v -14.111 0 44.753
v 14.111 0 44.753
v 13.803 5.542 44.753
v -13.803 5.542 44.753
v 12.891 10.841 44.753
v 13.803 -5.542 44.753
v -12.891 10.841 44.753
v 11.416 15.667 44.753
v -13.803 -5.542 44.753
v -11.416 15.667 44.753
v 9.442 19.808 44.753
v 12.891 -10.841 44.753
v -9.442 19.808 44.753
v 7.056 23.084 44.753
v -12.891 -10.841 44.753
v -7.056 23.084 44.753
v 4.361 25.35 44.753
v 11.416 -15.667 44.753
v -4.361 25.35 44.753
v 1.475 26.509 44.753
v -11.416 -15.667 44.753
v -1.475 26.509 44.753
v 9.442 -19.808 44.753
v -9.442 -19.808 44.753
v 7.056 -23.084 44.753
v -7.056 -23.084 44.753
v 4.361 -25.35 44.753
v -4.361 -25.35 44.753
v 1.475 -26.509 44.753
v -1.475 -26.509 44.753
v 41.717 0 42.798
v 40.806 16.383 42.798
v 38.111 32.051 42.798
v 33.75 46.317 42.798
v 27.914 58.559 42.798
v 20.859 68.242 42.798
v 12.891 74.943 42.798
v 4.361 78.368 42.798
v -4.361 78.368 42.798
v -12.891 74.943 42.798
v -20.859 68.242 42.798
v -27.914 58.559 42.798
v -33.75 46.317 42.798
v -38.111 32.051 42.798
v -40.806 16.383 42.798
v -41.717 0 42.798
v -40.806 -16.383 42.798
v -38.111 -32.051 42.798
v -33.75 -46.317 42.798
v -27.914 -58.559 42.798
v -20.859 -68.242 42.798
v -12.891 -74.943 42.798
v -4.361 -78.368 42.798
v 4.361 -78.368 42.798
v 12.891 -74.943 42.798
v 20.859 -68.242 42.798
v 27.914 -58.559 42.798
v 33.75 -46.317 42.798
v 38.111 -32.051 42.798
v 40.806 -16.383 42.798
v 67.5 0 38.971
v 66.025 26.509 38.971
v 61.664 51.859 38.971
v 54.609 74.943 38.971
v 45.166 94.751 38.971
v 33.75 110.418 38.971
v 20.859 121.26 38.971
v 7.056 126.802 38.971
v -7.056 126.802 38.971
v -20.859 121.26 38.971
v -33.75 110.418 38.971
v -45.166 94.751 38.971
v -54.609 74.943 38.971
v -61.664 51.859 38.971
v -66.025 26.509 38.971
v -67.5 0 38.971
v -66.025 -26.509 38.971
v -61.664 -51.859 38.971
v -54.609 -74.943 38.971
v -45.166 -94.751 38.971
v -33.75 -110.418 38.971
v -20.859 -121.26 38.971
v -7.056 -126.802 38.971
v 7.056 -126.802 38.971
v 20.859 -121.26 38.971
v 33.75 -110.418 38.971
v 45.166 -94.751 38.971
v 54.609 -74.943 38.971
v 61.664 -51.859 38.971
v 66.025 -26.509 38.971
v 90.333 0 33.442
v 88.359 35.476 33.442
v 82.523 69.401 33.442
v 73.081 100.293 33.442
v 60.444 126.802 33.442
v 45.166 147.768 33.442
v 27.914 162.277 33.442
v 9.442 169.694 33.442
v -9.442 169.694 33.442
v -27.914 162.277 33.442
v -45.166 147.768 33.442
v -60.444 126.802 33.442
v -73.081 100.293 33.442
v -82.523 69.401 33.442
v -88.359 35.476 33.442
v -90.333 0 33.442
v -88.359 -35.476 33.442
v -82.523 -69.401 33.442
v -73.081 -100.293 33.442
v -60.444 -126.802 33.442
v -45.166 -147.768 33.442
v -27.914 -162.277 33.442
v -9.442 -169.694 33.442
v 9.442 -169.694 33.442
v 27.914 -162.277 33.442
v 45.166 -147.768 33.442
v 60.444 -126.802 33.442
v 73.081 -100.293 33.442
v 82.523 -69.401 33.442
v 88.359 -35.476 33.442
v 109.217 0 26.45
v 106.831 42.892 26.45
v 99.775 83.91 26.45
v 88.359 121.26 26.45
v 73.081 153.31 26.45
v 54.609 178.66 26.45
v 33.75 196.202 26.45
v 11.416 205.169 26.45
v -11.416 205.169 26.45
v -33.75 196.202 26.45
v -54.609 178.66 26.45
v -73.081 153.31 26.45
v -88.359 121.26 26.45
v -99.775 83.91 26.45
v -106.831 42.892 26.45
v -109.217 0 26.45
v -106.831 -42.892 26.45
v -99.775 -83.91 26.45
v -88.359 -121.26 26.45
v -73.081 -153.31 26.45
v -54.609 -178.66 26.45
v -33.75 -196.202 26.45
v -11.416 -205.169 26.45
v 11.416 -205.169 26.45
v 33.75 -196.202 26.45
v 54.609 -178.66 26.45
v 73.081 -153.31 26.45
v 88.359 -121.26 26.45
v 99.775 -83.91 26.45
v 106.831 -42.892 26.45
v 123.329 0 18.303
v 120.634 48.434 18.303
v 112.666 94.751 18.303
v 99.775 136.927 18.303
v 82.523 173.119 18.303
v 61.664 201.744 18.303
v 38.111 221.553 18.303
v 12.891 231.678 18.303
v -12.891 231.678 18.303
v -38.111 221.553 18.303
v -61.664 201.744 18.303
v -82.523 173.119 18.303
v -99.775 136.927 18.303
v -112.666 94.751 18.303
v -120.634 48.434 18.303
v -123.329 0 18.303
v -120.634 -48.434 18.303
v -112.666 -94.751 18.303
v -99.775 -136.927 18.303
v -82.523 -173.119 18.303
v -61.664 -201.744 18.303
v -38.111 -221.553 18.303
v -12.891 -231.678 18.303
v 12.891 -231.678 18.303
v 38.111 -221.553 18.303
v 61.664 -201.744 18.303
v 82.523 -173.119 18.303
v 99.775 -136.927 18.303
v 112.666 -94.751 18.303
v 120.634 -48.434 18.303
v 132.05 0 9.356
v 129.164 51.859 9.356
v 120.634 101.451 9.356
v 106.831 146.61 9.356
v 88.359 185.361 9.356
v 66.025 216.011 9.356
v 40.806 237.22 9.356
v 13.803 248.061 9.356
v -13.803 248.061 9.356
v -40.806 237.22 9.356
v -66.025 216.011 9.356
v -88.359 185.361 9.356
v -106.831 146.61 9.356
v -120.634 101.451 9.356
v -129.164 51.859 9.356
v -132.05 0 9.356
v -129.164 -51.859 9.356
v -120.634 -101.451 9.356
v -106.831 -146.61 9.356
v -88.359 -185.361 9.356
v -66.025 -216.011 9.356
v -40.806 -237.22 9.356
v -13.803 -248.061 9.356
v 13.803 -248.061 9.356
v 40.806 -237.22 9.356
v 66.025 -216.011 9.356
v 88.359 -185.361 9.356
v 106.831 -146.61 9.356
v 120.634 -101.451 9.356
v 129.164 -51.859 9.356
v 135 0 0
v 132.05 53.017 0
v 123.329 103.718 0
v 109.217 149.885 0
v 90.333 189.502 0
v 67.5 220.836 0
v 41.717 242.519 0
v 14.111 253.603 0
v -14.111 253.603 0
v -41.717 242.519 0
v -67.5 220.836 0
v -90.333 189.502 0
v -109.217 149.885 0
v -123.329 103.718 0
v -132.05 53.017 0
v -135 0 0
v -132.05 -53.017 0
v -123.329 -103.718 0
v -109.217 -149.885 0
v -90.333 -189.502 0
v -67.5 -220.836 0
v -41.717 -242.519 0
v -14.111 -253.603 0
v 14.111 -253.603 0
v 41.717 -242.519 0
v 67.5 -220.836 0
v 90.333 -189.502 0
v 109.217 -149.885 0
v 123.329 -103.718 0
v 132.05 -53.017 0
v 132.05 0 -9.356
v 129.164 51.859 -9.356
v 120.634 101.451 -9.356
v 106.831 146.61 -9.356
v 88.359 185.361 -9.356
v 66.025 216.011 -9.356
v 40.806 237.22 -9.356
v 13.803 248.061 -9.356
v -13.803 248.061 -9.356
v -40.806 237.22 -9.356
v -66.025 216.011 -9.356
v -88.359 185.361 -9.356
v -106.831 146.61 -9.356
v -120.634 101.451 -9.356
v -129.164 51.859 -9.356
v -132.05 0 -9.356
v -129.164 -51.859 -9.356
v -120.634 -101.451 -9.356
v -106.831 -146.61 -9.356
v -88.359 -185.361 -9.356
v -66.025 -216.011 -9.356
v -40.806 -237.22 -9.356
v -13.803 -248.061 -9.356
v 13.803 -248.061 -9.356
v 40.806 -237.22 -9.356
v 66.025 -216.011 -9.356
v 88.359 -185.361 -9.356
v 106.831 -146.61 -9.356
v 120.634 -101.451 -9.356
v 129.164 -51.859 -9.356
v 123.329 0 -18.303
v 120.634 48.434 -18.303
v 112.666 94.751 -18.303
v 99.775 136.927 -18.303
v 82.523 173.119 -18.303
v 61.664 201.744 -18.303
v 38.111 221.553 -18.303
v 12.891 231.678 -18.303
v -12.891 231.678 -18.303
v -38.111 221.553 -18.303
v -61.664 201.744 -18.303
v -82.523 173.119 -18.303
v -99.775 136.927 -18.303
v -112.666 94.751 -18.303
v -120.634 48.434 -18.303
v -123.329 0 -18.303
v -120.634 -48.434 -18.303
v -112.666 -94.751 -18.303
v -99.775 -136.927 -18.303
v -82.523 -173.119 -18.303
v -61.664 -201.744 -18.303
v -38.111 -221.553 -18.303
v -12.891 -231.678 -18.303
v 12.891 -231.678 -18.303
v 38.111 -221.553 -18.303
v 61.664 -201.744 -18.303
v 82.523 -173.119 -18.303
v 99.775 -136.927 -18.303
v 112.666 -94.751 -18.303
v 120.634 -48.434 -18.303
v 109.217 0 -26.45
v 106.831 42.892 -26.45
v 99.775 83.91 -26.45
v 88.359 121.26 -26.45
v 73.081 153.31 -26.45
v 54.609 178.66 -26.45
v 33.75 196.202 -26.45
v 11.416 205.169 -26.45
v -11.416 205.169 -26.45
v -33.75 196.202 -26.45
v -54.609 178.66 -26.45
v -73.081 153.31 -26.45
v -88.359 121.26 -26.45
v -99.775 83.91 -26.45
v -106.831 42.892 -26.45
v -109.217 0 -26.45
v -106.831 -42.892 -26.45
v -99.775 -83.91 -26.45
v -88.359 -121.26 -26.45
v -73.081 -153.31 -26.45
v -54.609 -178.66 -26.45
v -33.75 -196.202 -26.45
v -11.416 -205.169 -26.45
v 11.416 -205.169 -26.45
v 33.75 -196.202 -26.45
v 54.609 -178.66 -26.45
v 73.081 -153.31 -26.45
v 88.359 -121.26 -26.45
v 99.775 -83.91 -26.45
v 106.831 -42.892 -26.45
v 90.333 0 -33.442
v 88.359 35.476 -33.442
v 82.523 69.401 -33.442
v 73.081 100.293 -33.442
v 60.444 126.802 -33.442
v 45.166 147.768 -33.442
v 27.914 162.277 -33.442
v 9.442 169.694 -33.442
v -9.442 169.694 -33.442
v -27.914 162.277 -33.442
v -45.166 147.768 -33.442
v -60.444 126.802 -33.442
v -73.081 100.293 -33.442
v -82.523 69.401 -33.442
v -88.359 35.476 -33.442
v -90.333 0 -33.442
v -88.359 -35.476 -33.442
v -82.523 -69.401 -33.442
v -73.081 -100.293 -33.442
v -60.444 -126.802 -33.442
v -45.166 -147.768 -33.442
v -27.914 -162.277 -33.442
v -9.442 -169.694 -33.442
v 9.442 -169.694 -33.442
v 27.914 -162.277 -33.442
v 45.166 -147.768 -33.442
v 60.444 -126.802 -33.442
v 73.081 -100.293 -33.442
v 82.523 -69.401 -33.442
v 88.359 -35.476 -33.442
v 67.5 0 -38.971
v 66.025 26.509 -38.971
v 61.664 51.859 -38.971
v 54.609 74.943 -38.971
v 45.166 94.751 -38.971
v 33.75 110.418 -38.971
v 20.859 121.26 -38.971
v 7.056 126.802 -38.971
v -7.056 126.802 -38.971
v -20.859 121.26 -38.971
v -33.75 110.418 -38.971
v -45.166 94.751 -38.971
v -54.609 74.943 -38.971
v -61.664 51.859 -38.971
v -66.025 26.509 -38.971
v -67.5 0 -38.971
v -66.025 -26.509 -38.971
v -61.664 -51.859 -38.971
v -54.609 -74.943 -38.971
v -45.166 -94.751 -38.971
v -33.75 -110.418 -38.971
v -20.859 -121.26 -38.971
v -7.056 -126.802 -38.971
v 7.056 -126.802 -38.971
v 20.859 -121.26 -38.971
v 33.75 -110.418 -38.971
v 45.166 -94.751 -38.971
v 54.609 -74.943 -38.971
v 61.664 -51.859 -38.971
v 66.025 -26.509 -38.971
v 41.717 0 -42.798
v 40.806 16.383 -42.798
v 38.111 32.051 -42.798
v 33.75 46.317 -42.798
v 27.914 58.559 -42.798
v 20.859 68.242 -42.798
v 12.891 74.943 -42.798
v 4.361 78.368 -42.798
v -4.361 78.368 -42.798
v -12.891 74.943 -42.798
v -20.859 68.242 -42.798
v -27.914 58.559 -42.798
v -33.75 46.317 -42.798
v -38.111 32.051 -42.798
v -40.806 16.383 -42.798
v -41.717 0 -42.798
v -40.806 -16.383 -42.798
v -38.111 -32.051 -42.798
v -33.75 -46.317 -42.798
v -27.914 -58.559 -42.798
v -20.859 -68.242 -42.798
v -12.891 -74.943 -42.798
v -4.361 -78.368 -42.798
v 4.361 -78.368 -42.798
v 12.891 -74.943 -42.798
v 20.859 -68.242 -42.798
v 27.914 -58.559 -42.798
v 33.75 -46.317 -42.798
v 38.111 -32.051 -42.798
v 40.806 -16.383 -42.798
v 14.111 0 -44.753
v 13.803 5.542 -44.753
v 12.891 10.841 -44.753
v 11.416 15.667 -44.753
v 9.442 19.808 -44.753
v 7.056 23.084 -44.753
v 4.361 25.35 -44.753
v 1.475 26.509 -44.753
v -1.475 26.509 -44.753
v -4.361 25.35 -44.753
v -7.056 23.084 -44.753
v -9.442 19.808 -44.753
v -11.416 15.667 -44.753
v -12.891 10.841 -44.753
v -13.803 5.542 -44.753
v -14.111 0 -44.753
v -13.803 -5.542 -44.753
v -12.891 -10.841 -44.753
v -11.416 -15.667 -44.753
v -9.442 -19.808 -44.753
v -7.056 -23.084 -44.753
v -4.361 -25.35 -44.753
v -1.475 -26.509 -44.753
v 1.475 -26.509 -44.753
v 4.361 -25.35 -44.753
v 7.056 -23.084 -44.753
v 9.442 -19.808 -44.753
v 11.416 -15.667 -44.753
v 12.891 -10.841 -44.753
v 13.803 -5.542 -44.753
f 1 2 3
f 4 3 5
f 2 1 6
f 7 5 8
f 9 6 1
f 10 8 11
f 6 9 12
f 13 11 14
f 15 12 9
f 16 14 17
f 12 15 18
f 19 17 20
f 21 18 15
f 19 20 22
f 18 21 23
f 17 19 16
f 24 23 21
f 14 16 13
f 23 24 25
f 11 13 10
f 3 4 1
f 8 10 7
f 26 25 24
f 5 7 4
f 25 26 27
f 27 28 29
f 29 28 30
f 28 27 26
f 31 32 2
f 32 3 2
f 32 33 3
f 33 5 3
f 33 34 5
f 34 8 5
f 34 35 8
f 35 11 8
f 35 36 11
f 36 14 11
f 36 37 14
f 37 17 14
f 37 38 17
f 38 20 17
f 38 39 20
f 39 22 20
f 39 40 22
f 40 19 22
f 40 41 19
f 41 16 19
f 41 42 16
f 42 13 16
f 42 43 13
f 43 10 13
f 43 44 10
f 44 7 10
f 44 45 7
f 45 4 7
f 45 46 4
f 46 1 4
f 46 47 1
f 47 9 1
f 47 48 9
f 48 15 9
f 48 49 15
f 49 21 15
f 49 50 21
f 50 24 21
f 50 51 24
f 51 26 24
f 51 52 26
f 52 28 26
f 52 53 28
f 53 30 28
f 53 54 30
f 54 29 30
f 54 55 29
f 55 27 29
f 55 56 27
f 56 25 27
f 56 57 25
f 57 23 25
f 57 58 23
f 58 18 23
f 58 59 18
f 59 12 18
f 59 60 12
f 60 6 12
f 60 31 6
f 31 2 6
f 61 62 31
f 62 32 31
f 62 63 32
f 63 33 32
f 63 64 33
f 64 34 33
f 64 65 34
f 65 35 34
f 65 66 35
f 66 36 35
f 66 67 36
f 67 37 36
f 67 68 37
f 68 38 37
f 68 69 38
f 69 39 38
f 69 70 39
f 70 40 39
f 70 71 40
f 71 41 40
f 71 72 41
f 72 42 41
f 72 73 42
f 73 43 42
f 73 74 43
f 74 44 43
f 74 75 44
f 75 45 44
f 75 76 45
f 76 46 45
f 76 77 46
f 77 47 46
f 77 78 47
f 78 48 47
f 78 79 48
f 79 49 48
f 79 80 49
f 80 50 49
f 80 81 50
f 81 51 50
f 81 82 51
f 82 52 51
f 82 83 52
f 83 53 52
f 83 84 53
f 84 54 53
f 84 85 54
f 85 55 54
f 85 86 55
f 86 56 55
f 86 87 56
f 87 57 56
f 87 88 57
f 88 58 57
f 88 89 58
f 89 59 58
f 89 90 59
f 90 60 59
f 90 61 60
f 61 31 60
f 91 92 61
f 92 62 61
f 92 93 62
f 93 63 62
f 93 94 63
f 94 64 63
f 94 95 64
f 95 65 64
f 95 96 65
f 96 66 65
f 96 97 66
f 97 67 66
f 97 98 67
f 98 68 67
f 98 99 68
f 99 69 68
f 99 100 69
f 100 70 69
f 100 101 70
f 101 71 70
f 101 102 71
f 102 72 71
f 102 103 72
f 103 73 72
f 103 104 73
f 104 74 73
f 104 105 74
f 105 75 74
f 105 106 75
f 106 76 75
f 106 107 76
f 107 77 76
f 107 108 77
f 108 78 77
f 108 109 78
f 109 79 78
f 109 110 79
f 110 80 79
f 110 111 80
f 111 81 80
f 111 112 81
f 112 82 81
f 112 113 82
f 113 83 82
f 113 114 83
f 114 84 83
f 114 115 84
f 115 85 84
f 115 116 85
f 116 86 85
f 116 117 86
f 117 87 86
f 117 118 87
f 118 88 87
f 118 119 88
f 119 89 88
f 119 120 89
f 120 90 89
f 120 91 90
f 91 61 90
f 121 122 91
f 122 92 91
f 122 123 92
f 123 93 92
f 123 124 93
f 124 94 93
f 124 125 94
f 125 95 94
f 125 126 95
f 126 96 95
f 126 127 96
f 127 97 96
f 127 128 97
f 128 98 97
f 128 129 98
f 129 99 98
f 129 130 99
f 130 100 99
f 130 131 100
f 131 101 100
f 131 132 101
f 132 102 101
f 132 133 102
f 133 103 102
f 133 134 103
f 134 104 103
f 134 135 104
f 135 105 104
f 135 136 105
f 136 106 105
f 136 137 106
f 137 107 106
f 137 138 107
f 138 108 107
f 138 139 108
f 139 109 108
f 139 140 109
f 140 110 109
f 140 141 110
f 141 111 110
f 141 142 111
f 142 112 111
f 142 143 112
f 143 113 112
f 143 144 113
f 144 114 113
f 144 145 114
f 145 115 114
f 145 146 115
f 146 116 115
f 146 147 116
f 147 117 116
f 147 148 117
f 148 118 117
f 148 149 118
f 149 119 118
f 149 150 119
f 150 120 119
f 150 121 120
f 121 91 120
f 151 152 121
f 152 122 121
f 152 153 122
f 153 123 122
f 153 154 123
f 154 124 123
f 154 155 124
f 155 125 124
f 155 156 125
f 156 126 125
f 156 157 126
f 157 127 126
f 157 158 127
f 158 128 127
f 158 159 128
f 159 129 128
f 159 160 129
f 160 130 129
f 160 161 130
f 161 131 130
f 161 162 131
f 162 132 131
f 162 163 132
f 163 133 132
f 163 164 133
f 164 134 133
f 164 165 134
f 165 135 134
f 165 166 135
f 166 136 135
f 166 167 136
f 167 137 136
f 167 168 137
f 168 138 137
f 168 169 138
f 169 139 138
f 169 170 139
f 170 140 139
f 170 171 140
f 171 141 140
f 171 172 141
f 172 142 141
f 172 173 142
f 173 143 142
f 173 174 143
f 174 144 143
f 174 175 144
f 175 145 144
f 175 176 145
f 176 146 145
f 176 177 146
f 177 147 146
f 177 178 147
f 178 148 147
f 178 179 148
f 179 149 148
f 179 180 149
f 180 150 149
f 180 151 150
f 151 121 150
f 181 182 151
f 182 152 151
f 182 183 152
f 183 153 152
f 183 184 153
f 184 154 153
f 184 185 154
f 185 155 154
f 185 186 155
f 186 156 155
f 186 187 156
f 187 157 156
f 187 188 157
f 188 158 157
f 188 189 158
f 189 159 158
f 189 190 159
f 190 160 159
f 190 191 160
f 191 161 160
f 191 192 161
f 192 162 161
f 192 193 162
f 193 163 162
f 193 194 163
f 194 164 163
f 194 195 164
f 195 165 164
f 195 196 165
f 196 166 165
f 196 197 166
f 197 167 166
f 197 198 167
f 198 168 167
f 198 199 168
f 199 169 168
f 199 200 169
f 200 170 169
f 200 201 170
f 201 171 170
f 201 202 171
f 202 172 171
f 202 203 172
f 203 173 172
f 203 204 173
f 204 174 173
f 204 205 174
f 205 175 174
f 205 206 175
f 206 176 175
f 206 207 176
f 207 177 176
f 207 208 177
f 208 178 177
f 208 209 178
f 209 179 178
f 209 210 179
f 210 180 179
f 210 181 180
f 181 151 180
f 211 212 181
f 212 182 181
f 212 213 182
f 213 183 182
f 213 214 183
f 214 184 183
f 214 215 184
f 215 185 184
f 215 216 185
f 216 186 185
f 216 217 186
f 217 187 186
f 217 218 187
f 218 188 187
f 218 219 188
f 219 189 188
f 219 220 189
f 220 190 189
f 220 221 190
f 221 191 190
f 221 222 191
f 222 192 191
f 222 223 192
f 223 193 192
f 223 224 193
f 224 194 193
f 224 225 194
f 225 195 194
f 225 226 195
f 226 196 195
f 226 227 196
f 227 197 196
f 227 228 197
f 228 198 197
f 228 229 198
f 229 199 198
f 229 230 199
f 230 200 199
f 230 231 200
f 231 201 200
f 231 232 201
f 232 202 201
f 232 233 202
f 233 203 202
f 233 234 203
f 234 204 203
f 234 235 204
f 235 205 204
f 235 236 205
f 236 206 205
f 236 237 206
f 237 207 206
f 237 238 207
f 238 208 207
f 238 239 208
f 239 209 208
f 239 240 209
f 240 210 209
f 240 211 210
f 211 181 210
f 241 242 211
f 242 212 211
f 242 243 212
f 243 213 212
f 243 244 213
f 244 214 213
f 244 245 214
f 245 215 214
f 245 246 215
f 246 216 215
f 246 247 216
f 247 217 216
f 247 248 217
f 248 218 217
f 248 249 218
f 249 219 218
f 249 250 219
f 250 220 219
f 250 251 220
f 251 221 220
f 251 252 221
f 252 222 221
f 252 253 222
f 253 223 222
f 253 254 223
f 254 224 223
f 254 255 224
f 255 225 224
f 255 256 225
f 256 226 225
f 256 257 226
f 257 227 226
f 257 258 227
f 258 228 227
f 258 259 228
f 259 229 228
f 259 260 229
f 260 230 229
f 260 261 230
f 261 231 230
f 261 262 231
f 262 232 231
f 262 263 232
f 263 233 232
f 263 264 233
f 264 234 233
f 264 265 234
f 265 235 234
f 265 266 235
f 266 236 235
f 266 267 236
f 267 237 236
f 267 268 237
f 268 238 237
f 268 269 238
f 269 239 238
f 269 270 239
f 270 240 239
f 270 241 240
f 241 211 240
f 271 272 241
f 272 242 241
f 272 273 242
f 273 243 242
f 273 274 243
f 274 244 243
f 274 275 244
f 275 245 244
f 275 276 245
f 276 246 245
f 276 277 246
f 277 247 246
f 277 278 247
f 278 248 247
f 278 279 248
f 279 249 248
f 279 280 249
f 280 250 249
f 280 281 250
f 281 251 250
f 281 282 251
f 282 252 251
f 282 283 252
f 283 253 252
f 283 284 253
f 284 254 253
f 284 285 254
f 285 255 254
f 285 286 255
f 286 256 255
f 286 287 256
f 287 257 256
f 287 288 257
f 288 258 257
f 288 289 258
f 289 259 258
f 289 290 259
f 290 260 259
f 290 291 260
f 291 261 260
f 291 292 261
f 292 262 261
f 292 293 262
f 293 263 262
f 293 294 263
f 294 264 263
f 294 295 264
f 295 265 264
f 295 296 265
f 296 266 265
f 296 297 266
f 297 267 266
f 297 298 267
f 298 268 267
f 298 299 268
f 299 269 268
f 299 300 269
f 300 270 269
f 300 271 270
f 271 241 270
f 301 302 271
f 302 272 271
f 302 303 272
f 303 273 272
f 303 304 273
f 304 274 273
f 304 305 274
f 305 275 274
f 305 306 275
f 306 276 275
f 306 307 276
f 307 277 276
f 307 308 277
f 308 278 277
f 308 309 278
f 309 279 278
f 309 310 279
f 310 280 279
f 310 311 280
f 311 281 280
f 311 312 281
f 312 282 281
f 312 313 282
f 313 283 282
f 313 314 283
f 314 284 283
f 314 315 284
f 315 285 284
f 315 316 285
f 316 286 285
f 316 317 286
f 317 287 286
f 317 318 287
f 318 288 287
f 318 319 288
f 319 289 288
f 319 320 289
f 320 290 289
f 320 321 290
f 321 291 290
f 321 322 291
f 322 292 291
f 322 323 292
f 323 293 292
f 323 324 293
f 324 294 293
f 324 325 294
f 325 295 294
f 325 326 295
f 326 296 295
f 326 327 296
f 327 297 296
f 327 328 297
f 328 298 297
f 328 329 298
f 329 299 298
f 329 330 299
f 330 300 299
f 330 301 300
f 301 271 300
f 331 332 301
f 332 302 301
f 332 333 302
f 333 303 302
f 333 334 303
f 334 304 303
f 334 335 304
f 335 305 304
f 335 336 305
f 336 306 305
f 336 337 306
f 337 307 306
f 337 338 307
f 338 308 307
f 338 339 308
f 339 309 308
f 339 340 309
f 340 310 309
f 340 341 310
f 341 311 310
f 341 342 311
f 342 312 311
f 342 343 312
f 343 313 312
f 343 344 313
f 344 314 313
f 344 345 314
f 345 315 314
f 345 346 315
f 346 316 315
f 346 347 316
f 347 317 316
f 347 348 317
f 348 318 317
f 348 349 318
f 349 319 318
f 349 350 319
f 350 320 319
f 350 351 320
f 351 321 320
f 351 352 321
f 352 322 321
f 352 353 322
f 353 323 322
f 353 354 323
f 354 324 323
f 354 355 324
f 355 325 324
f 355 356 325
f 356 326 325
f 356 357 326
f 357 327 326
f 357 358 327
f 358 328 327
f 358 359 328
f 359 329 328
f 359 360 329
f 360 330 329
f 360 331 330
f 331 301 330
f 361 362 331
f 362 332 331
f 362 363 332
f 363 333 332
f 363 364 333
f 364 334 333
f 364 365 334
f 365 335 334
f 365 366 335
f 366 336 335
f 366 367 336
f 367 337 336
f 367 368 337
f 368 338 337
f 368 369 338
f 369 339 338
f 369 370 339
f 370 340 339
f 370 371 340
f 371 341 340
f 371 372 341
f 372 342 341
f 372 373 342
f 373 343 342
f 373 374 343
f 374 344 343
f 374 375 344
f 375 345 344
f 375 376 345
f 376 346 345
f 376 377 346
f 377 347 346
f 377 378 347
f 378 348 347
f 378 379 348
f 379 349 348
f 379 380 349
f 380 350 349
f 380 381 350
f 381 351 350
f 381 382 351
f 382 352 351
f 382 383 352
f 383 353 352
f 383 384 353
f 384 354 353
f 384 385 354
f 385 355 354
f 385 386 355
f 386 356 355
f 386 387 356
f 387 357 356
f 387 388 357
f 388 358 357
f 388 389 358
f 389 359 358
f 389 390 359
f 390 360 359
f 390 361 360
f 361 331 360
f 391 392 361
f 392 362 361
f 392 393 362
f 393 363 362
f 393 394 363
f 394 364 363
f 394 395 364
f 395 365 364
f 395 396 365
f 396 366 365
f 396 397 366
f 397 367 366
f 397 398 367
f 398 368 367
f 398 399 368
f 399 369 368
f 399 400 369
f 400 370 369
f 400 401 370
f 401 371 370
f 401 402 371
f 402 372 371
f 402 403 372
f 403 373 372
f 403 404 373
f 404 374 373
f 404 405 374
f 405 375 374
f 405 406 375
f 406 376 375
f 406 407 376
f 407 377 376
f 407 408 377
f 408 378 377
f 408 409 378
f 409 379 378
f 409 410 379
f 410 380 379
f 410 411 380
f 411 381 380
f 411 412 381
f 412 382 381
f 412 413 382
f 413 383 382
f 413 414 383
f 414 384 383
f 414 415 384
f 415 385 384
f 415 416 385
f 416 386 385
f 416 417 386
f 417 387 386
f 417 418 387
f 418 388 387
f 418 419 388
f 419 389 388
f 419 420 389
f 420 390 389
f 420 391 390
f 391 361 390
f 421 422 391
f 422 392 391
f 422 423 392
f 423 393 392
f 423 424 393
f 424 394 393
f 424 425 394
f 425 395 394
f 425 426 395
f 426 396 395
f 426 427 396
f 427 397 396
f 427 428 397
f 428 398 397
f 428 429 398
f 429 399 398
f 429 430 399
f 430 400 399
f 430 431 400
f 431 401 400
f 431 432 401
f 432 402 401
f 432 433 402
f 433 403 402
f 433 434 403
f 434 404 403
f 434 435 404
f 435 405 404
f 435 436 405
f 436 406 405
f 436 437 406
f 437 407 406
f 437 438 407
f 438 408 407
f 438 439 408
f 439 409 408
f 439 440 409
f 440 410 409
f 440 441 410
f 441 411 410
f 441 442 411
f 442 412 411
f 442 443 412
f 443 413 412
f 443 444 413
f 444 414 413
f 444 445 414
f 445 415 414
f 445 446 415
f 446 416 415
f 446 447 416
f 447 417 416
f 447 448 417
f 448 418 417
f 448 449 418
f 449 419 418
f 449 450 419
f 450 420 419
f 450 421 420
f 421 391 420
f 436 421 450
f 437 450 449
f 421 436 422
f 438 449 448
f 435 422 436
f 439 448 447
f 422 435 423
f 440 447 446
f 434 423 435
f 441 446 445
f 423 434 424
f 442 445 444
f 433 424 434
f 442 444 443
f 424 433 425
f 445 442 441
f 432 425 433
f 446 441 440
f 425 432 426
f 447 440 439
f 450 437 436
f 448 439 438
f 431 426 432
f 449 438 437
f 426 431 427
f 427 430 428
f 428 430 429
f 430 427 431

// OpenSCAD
// Generated by SolidPython 1.0.1 on 2020-07-29 00:46:49


scale(v = [9, 17, 3]) {
	sphere(r = 15);
}
/***********************************************
*********      SolidPython code:      **********
************************************************
 
# import packages: SolidPython
from solid import *
from solid.utils import *
from itertools import chain, combinations, permutations


class Resize:

    def __init__(self, scad_file):
        self.scad_file = scad_file
        #self.scad_file = import_scad(scad_file)
        # cone/cylinder param:
        self.r1 = 0
        self.r2 = 0
        self.h = 0
        # rectangular prism param:
        self.w = 0
        self.l = 0
        # ellipse param:
        self.r = 0

    # import OpenScad code (file name corresponds to shape)


    # classify shape + parameters
    def assign(self, param1, param2, param3):
        if self.scad_file == 'cone.scad':
            self.r1 = param1
            self.r2 = param2
            self.h = param3
        elif self.scad_file == 'cylinder.scad':
            self.r1 = param1
            self.r2 = param2
            self.h = param3
        elif self.scad_file == 'rectangularPrism.scad':
            self.h = param1
            self.l = param2
            self.w = param3
        else:
            self.r = param1
            self.h = param2

    # resize parameters
    def iterate(self):
        x = range(3, 20, 2)
        i = 1
        if self.scad_file == 'cone.scad':
            tempList = list(permutations(x, 2))
            for temp in tempList:
                param1 = temp[0]
                param2 = temp[1]
                filepath = 'produced_scad_files/' + 'cone' + str(param1) + '_' + str(param2) + '_' + '.scad'
                scad_render_to_file(cylinder(h=param1, r1=param2, r2=0), filepath)

        elif self.scad_file == 'cylinder.scad':
            tempList = list(permutations(x, 3))
            for temp in tempList:
                param1 = temp[0]
                param2 = temp[1]
                filepath = 'produced_scad_files/' + 'cylinder' + str(param1) + '_' + str(param2) + '_' + '.scad'
                scad_render_to_file(cylinder(h=param1, r1=param2, r2=param2), filepath)

        elif self.scad_file == 'rectangularPrism.scad':
            tempList = list(permutations(x, 3))
            for temp in tempList:
                param1 = temp[0]
                param2 = temp[1]
                param3 = temp[2]
                filepath = 'produced_scad_files/' + 'rectangularPrism' + str(param1) + '_' + str(param2) + '_' + str(
                    param3) + '.scad'
                scad_render_to_file(cube(size=(param1, param2, param3)), filepath)

        elif self.scad_file == 'ellipse.scad':
            tempList = list(permutations(x, 4))
            for temp in tempList:
                param1 = temp[0]
                param2 = temp[1]
                param3 = temp[2]
                param4 = temp[3]
                filepath = 'produced_scad_files/' + 'ellipse' + str(param1) + '_' + str(param2) + '_' + str(param3) + '_' + str(param4) + '.scad'
                scad_render_to_file(scale([param1, param2, param3])(sphere(r=param4)), filepath)

    def render_to_scadfile(self):
        scad_render_to_file(scad, 'example.scad') 
 
************************************************/
